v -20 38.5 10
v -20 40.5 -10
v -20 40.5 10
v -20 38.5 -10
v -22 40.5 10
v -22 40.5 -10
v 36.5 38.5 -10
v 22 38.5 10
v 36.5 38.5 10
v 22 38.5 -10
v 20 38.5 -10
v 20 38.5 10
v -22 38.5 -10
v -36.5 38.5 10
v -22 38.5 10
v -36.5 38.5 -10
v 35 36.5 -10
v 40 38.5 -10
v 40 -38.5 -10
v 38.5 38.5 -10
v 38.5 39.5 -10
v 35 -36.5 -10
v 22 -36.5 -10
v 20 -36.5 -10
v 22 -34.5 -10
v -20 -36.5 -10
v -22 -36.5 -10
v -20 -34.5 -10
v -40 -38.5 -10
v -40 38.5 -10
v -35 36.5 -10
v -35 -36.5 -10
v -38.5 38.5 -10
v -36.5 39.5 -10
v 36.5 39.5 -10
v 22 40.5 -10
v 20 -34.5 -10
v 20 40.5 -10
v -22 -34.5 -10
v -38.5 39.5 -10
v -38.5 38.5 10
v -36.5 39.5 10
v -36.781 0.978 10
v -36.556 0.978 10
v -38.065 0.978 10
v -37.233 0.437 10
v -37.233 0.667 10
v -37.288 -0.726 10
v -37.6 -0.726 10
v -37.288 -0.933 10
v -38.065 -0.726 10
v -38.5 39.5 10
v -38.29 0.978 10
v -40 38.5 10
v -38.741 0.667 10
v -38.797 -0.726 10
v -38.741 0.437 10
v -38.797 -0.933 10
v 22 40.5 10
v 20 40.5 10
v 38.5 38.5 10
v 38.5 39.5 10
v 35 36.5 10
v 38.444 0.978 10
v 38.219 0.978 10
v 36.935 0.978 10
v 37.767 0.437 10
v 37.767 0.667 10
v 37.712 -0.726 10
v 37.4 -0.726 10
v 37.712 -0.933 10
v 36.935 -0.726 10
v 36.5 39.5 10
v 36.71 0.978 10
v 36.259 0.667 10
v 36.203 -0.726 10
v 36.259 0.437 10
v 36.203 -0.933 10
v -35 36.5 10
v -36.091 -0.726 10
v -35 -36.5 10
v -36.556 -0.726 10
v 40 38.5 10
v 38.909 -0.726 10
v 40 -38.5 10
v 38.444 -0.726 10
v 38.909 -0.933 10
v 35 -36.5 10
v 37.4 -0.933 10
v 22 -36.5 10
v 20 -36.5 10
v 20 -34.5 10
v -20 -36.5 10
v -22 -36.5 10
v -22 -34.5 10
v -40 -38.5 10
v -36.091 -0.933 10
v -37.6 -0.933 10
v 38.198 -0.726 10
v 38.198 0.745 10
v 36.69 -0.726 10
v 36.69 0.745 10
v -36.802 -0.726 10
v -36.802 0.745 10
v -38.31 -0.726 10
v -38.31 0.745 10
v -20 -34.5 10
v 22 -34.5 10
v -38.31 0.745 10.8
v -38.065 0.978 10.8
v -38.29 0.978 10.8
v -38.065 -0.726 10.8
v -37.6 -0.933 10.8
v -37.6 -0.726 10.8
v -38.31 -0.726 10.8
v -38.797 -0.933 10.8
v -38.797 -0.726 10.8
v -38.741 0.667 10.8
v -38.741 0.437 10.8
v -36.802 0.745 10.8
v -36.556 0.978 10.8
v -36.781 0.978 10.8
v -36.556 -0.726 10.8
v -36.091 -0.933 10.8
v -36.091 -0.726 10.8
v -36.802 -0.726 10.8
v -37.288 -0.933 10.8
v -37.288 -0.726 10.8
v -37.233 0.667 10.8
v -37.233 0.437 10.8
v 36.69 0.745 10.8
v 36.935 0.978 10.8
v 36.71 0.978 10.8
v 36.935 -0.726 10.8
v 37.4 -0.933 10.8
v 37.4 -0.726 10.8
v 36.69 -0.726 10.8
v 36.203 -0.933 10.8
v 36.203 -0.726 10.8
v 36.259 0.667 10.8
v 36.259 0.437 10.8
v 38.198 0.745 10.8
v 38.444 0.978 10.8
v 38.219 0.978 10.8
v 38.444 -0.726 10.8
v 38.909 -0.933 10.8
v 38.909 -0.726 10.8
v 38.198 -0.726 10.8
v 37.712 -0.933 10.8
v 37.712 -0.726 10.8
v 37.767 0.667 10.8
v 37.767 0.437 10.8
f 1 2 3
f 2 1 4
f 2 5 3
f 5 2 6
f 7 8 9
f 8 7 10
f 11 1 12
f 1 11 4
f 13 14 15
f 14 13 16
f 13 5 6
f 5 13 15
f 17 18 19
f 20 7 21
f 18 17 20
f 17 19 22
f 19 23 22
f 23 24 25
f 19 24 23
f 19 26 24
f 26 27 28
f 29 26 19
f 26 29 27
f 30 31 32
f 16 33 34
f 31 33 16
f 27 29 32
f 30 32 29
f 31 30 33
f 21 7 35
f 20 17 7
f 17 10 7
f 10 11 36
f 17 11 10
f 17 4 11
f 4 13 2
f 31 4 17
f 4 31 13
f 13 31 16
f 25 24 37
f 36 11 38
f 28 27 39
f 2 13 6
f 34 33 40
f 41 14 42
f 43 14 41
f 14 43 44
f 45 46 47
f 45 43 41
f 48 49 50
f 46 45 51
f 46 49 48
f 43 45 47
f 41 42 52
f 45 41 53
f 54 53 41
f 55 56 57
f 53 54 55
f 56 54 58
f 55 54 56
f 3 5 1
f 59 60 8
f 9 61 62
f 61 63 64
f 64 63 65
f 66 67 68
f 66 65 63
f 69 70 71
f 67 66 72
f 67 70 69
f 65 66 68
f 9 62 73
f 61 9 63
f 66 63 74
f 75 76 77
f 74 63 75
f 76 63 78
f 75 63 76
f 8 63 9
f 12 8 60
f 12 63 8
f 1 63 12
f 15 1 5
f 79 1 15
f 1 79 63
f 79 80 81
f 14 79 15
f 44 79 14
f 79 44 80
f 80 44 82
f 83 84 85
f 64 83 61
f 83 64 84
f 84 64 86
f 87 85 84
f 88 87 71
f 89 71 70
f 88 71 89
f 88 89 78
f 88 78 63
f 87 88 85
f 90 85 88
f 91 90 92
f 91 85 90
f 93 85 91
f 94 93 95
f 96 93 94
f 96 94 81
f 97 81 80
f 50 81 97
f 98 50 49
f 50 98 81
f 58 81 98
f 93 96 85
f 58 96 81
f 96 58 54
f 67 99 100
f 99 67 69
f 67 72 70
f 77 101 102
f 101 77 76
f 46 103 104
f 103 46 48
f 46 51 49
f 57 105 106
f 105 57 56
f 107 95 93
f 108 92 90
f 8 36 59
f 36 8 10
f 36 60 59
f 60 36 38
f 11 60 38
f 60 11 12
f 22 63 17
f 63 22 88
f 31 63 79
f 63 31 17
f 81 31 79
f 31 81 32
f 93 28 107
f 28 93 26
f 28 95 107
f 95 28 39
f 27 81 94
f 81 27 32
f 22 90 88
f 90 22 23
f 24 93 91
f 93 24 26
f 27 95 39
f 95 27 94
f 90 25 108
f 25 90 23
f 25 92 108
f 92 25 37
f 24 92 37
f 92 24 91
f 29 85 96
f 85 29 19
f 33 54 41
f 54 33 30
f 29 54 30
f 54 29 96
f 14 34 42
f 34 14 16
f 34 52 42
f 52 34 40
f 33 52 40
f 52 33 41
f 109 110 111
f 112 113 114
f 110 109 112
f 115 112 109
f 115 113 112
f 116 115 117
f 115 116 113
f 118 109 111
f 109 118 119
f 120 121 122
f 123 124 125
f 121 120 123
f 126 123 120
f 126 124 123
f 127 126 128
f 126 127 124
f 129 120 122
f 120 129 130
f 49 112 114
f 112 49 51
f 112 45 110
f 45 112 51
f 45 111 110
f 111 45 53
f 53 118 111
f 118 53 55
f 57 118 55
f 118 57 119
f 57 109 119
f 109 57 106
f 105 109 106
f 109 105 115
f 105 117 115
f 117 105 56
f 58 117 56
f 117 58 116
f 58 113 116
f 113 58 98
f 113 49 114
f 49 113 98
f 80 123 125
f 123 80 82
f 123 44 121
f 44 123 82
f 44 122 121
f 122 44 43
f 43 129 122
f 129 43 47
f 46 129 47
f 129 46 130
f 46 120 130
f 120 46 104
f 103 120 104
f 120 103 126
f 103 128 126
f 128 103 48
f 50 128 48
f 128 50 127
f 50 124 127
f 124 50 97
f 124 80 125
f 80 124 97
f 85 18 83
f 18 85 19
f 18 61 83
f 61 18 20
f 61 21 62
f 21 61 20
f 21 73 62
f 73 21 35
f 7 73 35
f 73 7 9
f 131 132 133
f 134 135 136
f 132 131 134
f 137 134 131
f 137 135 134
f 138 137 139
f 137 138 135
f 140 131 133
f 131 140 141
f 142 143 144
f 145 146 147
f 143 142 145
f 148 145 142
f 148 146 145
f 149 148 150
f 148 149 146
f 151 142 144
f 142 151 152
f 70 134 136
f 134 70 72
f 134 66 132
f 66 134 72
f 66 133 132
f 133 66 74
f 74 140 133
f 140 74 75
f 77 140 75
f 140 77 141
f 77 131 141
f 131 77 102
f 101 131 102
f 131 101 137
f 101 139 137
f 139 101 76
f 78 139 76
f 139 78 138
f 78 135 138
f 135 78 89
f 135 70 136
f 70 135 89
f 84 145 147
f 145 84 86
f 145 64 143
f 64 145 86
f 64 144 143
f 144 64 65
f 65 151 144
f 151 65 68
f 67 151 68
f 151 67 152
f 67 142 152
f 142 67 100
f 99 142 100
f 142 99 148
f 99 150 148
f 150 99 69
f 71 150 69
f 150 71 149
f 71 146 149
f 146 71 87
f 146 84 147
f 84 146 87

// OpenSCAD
trackwidth = 40;
border = 15;
standoffwidth = 5;

depth = 20;
plateheight =2;

heightSteps = 7;



//preview shows all
preview=false;

//change for different modules
x=11;

if(preview){
for(part=[1:10]){
    translate([0,part*(depth+5),0])
    unit(part*heightSteps);
}
}
else{
    for(part=[x:x]){
    rotate([-90,0,0])
    unit(part*heightSteps);
    }
}


module unit(unitheight){
plate(unitheight/2-plateheight/2, true);
plate(-unitheight/2+plateheight/2, (unitheight>65));

// standoff left
translate([-trackwidth/2-border-(standoffwidth/2),0, 0])
standoff(unitheight);

// standoff right
translate([+trackwidth/2+border+(standoffwidth/2),0,0])
standoff(unitheight);
}

module standoff(unitheight){
    color("blue")
    difference(){
        cube([standoffwidth, depth, unitheight], center = true);
    // cutout
  //#translate([0,0,-unitheight/2])    
    //    cube([plateheight+1, depth+5, plateheight], center=true);
    }
    
    
    color("#00FFFF")
    translate([0,0,unitheight/2])
    cube([plateheight, depth, plateheight], center=true);
    
    //label
    if(unitheight>0){
        color("pink")
        translate([0, -depth/2, 0])
        rotate([90,0,0])
        linear_extrude(0.8, false)
        text(str(unitheight/heightSteps),2, valign="center", halign = "center");
    }
    
    
}

module plate(offset, addRails){
 // offset = offset - plateheight/2;   
    // base plate
    cutoutwidth=32;
    translate([0,0,offset])
     //trackwidth+2*border
    difference(){
        cube([trackwidth+2*border, depth, plateheight], center=true);
        if(!addRails){
        translate([-17, 0,0])
        #cube([cutoutwidth, depth-plateheight*2, plateheight+2], center=true);
        translate([17, 0,0])
        #cube([cutoutwidth, depth-plateheight*2, plateheight+2], center=true);
        }
        
    }
    if(addRails){
        // rails line left
        translate([-trackwidth/2-plateheight/2,0, plateheight+ offset])
        cube([plateheight, depth, plateheight], center=true);

        // rails line right
        translate([+trackwidth/2+plateheight/2,0, plateheight+ offset])
        cube([plateheight, depth, plateheight], center=true);
    }
    
}
